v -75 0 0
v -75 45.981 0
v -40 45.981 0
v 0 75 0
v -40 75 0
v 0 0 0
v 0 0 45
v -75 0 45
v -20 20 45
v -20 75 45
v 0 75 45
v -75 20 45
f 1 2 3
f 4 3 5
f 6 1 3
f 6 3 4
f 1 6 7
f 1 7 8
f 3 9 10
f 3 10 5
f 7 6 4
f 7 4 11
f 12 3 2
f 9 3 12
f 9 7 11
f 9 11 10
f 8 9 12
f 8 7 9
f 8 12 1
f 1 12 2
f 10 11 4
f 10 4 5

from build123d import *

# Parameters (mm, degrees)
EXTRUDE1_DEPTH = 75
EXTRUDE2_DEPTH = 75


with BuildPart() as part:
    # Sketch1 → Extrude1 (new body)
    with BuildSketch(Plane(origin=(0, 0, 0), x_dir=(1, 0, 0), z_dir=(0, 1, 0))):
        Polygon((0, 0), (0, -45), (-20, -45), (-40, 0), align=None)
    extrude(amount=EXTRUDE1_DEPTH)

    # Sketch2 → Extrude2 (add)
    with BuildSketch(Plane(origin=(0, 0, 0), x_dir=(0, 0, -1), z_dir=(1, 0, 0))):
        Polygon((-45, 20), (-45, 0), (0, 0), (0, 45.980762114), align=None)
    extrude(amount=-EXTRUDE2_DEPTH)


solid = part.part
